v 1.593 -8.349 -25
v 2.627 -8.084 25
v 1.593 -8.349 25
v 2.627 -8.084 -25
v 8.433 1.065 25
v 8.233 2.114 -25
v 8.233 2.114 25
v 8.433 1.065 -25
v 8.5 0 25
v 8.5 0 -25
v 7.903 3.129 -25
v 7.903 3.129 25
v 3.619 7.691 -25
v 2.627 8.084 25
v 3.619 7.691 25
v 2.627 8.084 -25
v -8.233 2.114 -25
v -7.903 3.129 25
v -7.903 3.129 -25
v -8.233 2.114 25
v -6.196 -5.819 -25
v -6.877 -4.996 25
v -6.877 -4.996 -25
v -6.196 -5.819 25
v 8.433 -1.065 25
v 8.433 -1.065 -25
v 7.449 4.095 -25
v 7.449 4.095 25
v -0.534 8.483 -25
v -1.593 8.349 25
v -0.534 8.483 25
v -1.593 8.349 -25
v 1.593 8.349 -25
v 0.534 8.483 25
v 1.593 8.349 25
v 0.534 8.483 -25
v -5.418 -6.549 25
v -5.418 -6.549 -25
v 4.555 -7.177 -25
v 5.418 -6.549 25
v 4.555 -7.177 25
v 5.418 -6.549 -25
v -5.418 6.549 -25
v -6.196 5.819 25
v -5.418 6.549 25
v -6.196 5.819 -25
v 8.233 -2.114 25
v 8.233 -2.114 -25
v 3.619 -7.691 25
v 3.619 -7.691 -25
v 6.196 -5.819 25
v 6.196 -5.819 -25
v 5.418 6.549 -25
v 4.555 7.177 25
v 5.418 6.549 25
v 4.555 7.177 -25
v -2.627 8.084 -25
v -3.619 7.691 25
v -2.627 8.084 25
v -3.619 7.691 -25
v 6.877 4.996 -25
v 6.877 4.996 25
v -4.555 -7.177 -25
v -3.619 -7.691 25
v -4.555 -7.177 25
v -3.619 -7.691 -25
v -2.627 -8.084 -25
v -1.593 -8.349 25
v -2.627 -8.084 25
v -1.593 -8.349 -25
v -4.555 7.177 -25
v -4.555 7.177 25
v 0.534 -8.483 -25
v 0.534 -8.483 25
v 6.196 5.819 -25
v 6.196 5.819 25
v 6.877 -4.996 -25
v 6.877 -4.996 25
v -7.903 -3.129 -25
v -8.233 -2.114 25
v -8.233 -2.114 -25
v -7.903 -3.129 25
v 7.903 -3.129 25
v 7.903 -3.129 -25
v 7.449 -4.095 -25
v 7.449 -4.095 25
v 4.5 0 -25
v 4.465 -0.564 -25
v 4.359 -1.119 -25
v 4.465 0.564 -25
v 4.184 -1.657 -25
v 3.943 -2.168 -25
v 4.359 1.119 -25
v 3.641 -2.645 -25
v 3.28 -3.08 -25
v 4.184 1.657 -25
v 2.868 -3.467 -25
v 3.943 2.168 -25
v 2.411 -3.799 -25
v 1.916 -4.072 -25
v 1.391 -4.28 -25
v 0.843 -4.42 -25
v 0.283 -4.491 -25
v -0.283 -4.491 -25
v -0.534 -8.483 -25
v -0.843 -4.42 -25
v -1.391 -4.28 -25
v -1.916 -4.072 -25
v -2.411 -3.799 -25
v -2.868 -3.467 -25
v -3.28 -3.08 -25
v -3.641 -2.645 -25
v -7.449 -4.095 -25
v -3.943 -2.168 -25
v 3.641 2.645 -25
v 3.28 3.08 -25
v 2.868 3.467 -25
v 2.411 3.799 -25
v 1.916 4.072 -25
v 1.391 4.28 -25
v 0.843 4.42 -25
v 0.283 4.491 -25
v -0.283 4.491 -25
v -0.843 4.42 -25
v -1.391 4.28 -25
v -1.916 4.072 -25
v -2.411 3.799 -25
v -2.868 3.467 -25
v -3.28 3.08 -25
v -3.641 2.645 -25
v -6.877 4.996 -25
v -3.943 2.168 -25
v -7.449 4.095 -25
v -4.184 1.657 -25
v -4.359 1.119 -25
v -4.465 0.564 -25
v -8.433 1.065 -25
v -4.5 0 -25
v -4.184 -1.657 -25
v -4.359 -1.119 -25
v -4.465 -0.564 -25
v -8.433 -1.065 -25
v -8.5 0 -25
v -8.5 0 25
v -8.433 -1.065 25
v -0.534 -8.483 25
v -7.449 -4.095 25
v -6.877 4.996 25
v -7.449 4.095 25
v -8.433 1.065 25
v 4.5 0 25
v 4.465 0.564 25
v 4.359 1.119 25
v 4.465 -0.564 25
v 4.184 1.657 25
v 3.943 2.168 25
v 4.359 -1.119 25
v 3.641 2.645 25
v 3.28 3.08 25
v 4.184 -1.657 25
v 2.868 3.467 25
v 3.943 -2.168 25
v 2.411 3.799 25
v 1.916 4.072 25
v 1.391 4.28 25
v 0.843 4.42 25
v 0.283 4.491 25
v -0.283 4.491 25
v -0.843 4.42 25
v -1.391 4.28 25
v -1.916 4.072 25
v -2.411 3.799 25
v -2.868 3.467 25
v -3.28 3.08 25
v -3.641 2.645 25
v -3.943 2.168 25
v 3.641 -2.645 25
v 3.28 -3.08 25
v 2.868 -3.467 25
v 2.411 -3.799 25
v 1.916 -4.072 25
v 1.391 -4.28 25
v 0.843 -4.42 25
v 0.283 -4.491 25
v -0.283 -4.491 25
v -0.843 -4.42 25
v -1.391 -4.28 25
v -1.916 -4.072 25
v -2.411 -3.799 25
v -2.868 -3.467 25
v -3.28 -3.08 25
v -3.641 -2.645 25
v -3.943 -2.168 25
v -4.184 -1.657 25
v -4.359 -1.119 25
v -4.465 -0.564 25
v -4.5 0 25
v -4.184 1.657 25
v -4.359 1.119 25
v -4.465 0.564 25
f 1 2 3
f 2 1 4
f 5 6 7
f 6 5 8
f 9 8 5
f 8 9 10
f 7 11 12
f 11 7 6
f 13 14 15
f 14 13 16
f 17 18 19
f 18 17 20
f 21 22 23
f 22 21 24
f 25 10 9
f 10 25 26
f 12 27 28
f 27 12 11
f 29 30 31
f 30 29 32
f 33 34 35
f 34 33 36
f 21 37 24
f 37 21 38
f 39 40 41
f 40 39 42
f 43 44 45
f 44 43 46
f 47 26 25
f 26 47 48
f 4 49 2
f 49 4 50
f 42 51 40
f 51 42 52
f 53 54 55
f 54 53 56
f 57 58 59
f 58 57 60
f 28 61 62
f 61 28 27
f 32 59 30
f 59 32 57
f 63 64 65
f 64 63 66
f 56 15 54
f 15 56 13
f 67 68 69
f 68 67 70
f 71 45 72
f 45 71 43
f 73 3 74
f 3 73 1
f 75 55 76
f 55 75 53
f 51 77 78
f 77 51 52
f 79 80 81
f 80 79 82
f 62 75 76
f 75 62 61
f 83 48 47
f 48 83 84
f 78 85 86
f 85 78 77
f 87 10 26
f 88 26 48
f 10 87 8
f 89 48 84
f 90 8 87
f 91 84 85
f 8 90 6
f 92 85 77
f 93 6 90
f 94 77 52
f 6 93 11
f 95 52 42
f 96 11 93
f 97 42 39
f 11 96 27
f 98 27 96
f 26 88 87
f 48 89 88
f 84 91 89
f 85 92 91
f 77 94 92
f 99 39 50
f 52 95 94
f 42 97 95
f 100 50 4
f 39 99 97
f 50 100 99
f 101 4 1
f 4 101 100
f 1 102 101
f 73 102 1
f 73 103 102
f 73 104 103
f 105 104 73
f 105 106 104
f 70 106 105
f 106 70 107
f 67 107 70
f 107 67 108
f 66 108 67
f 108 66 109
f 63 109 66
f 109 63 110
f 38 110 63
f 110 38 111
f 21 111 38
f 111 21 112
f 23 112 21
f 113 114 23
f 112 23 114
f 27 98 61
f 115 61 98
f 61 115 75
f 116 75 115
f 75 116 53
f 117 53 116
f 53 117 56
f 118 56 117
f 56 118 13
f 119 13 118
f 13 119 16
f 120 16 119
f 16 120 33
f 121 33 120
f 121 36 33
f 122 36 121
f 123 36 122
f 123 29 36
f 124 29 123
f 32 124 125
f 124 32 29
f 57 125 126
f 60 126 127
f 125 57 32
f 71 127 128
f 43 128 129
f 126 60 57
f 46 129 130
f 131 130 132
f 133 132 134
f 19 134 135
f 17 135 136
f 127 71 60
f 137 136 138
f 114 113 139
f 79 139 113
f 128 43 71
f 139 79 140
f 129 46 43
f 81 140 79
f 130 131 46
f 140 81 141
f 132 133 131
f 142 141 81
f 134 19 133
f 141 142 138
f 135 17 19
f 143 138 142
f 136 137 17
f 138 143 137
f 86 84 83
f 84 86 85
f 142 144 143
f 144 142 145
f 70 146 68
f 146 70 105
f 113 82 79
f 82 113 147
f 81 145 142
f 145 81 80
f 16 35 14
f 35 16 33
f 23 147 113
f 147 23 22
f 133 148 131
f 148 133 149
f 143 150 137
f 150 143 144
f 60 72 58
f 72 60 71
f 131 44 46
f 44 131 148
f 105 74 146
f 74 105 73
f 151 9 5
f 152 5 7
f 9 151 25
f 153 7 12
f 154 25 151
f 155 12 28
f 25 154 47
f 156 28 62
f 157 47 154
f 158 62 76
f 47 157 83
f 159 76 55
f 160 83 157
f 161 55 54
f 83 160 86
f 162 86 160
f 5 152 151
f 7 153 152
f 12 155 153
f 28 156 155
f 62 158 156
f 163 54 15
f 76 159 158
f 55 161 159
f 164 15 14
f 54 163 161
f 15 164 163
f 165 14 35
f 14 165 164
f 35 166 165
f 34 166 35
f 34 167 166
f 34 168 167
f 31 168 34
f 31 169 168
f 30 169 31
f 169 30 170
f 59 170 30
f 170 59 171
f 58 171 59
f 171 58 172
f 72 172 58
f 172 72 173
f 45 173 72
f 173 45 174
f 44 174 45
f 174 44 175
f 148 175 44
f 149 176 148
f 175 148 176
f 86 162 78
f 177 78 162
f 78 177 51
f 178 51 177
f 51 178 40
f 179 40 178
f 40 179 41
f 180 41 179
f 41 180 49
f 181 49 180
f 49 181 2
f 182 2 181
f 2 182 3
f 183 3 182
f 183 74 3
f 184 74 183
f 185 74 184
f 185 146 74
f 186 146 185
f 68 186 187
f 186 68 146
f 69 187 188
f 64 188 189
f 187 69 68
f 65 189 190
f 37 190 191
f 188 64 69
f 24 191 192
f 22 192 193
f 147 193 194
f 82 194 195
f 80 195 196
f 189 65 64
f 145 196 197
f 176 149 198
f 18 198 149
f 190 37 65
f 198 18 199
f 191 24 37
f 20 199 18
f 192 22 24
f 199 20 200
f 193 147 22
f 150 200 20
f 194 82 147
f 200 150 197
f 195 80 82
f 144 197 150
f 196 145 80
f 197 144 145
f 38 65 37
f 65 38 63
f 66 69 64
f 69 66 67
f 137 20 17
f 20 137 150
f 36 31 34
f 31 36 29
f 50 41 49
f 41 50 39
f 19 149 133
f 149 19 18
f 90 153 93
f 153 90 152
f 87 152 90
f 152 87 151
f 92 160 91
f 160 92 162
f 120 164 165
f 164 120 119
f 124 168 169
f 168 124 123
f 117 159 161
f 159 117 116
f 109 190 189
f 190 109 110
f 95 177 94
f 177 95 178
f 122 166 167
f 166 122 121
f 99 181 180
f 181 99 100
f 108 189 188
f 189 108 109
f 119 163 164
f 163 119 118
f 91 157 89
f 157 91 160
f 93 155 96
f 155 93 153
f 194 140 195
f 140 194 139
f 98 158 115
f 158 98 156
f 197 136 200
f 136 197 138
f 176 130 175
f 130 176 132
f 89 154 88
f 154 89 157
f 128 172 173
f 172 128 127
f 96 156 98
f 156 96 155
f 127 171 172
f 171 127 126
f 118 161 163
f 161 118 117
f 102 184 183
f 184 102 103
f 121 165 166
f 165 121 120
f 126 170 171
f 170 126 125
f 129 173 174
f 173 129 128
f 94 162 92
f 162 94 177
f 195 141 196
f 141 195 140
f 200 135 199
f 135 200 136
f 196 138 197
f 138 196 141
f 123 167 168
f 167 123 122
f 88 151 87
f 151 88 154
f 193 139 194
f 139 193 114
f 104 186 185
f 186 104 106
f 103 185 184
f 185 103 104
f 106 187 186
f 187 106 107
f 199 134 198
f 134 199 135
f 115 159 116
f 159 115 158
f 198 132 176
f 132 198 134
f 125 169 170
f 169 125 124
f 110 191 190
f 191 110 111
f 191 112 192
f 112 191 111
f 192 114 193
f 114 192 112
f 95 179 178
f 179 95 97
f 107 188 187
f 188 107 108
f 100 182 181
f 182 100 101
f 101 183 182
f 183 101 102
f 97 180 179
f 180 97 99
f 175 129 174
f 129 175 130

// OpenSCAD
$fn = 50;


difference() {
	union() {
		translate(v = [0, 0, -25.0000000000]) {
			cylinder(h = 50, r = 8.5000000000);
		}
	}
	union() {
		translate(v = [0, 0, -100.0000000000]) {
			cylinder(h = 200, r = 4.5000000000);
		}
	}
}
